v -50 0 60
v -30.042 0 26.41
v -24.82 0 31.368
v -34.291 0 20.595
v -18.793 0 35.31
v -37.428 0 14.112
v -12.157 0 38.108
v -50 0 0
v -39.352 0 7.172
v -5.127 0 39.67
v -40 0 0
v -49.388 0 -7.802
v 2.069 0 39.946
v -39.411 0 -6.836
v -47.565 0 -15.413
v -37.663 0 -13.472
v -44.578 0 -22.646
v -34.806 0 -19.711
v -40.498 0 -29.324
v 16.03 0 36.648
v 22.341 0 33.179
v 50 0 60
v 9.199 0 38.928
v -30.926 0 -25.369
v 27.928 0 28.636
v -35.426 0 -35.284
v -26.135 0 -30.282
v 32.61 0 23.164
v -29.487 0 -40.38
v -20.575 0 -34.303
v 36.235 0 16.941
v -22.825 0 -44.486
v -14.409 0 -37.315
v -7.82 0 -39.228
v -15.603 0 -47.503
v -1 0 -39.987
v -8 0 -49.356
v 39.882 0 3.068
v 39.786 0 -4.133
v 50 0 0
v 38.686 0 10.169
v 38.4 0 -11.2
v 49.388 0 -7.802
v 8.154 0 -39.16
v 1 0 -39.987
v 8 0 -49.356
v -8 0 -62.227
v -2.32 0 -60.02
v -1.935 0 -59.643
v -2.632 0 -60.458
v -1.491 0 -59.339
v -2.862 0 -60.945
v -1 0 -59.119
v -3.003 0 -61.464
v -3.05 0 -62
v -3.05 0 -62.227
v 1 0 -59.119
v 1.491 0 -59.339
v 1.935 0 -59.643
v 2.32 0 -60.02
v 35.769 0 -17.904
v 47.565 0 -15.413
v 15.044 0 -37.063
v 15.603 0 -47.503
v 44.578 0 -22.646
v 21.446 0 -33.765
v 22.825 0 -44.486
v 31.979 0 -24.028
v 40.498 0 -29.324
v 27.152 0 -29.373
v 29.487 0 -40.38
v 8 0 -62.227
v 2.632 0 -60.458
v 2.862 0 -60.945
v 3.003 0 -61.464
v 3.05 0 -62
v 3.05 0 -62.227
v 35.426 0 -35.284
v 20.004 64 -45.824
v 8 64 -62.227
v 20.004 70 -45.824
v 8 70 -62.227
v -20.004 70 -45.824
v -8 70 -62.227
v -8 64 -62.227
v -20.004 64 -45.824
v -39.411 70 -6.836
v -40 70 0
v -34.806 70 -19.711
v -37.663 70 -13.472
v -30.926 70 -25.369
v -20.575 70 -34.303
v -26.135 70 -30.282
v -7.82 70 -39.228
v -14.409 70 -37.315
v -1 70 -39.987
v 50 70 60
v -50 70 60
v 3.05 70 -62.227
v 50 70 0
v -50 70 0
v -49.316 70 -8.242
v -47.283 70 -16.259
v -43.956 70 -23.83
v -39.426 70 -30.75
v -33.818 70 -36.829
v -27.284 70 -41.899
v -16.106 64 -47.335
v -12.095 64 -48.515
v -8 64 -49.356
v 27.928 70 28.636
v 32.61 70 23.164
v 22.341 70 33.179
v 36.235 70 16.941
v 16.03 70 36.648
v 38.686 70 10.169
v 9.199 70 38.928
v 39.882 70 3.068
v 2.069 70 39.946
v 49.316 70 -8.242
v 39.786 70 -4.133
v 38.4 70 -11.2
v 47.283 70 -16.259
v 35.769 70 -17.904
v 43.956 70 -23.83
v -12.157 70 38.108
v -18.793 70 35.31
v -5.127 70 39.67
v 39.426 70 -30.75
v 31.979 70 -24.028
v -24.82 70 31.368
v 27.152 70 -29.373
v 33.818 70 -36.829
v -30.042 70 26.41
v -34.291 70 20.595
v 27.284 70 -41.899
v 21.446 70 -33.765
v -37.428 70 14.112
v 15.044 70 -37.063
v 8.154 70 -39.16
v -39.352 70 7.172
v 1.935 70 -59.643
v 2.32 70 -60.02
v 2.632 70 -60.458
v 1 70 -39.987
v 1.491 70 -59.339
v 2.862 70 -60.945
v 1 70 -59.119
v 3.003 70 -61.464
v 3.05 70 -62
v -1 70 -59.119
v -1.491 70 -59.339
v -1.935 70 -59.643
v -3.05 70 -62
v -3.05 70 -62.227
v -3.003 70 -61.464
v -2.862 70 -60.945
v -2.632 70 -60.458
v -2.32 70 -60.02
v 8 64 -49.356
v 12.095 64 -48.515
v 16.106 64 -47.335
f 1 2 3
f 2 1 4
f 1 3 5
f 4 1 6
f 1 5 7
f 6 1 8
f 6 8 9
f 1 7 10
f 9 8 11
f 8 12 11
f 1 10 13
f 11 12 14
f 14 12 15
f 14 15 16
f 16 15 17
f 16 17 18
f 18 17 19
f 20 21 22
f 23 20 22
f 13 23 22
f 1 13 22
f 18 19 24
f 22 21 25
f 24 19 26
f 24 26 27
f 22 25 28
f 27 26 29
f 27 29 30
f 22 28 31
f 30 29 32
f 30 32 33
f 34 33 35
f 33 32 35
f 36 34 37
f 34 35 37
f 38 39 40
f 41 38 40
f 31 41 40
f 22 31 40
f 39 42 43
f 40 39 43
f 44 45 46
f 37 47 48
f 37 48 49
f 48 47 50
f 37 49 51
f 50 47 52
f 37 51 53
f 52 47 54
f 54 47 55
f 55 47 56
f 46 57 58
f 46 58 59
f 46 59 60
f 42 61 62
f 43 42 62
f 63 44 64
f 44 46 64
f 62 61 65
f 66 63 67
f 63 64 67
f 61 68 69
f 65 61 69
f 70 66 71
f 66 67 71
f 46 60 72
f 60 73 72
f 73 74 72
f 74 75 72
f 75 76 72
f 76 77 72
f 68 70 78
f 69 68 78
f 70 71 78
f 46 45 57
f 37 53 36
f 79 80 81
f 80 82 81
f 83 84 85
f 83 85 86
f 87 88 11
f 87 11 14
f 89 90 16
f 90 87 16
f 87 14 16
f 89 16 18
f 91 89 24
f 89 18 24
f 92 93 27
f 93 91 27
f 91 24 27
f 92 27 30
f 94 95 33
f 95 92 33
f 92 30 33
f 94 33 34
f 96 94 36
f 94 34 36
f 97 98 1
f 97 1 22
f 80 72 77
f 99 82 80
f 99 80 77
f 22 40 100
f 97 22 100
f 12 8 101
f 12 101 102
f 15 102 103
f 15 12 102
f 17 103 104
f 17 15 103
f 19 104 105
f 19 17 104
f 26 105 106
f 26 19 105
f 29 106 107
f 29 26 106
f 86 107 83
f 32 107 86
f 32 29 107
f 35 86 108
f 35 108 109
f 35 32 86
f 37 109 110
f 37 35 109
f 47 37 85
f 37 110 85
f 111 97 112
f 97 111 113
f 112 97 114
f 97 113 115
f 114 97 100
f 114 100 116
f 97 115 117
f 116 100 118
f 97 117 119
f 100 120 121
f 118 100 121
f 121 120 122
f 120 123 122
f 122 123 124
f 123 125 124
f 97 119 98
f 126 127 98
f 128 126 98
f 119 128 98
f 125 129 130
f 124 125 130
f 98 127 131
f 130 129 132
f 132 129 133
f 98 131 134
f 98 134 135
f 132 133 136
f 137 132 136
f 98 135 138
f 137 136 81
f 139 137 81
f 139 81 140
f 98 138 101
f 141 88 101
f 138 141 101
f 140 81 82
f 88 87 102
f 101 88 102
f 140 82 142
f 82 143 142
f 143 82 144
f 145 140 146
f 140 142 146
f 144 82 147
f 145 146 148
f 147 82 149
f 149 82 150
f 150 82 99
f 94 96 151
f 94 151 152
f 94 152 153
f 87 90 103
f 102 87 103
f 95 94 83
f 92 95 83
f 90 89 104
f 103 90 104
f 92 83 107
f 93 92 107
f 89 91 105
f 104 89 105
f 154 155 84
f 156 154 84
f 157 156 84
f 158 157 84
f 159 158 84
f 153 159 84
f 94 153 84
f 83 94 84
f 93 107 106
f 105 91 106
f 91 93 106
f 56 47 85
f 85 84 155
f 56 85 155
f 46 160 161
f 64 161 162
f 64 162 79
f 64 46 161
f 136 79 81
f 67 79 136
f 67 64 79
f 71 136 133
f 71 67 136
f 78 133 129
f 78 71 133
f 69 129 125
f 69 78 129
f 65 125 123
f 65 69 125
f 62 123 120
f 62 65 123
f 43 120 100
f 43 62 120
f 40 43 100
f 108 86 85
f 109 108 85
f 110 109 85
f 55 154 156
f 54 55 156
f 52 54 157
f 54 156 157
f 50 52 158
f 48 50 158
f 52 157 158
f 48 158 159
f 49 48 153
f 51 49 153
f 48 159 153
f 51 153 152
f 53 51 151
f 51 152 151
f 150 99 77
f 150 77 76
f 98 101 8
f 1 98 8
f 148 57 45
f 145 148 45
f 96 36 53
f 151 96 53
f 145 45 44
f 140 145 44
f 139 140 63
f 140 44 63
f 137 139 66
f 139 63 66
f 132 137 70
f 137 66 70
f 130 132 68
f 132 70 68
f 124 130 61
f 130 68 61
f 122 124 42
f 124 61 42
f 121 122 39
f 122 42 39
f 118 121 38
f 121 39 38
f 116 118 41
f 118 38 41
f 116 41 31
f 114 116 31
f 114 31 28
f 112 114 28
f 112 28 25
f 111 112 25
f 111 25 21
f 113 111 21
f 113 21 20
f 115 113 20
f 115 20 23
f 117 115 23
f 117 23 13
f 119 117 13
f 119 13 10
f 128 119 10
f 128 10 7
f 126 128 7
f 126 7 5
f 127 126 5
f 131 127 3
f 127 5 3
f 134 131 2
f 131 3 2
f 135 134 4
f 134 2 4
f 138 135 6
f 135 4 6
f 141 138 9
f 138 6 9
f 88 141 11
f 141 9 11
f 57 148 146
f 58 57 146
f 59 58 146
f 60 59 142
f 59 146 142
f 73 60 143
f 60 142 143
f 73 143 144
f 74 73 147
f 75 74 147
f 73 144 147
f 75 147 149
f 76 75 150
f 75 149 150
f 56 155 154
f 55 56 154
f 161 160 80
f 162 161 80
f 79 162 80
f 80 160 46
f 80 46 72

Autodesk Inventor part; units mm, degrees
ref_plane "YZ Plane" through (0, 0, 0) normal (1, 0, 0) x (0, 1, 0)
ref_plane "XZ Plane" through (0, 0, 0) normal (0, 1, 0) x (-1, 0, 0)
ref_plane "XY Plane" through (0, 0, 0) normal (0, 0, 1) x (1, 0, 0)
sketch "Sketch1" plane through (0, 0, 0) normal (0, 1, 0) x (-1, 0, 0)
  circle A0 centre (0, 0) radius 50
  circle A1 centre (0, 0) radius 40
  line L0 (50, 0) -> (-50, 0)
  line L1 (-50, 0) -> (-50, 50)
  line L2 (-50, 50) -> (50, 50)
  line L3 (50, 50) -> (50, 0)
  line L4 (6, -46) -> (-6, -46)
  line L5 (-6, -46) -> (-6, -62)
  line L6 (-6, -62) -> (6, -62)
  line L7 (6, -62) -> (6, -46)
  line L8 (1, -64) -> (-1, -64)
  line L9 (-1, -64) -> (-1, -35)
  line L10 (-1, -35) -> (1, -35)
  line L11 (1, -35) -> (1, -64)
  point P0 (1, -39.9875)
  point P1 (1, -62)
  point P2 (6, -49.6387)
  point P3 (-6, -49.6387)
  point P4 (-1, -62)
  point P5 (-1, -39.9875)
  dimension "d0" = 100
extrude "Extrusion1" add sketch "Sketch1" along normal blind 70 contours L0 A1 A0 | A0 L7 L4 L11 A1 L0 | A0 L2 L3 | A0 L1 L2 | L7 L6 L11 A0 | A0 L11 L4 L7 | L0 A1 L9 L4 L5 A0 | L5 L4 L9 A0 | A0 L9 L6 L5
sketch "Sketch2" plane through (0, 70, 0) normal (0, 1, 0) x (1, 0, 0)
  circle A0 centre (0, 62) radius 3.05
  dimension "d9" = 6.1
extrude "Extrusion2" cut sketch "Sketch2" against normal blind 100
sketch "Sketch3" plane through (0, 70, 0) normal (0, 1, 0) x (1, 0, 0)
  line L0 (-3.05, 48) -> (-8, 48)
  line L1 (-8, 48) -> (-8, 62.2274)
  line L2 (-8, 62.2274) -> (-3.05, 62.2274)
  line L3 (-3.05, 62.2274) -> (-3.05, 48)
  line L4 (3.0501, 48) -> (8, 48)
  line L5 (8, 48) -> (8, 62.2274)
  line L6 (8, 62.2274) -> (3.0501, 62.2274)
  line L7 (3.0501, 62.2274) -> (3.0501, 48)
extrude "Extrusion3" add sketch "Sketch3" against normal up to surface (70 mm away)
sketch "Sketch4" plane through (0, 70, 0) normal (0, 1, 0) x (1, 0, 0)
  line L0 (8, 62.2274) -> (3.0501, 62.2274) construction
  line L1 (-3.05, 62.2274) -> (-8, 62.2274) construction
  arc A0 (-8, 49.3559) -> (-50, 0) centre (0, 0) ccw construction
  arc A1 (50, 0) -> (8, 49.3559) centre (0, 0) ccw construction
  line L2 (-8, 62.2274) -> (-20.0044, 45.8238)
  line L3 (8, 62.2274) -> (20.0044, 45.8238)
  line L4 (-20.0044, 45.8238) -> (-5.525, 45.8238)
  line L5 (-5.525, 45.8238) -> (-5.525, 62.2274)
  line L6 (-8, 62.2274) -> (-5.525, 62.2274)
  line L7 (20.0044, 45.8238) -> (5.5251, 45.8238)
  line L8 (5.5251, 45.8238) -> (5.5251, 62.2274)
  line L9 (5.5251, 62.2274) -> (8, 62.2274)
extrude "Extrusion4" add sketch "Sketch4" against normal blind 6
sketch "Sketch5" plane through (-50, 0, 50) normal (0, 0, 1) x (1, 0, 0)
  line L0 (46.95, 70) -> (46.95, 0) construction
  line L1 (0, 0) -> (100, 0) construction
  line L2 (100, 0) -> (100, 70) construction
  line L3 (0, 70) -> (100, 70) construction
  line L4 (0, 0) -> (0, 70) construction
  line L5 (0, 0) -> (100, 0)
  line L6 (100, 0) -> (100, 70)
  line L7 (100, 70) -> (0, 70)
  line L8 (0, 70) -> (0, 0)
  point P0 (50, 0)
extrude "Extrusion5" add sketch "Sketch5" along normal blind 10
properties part number "MotorClamp"
